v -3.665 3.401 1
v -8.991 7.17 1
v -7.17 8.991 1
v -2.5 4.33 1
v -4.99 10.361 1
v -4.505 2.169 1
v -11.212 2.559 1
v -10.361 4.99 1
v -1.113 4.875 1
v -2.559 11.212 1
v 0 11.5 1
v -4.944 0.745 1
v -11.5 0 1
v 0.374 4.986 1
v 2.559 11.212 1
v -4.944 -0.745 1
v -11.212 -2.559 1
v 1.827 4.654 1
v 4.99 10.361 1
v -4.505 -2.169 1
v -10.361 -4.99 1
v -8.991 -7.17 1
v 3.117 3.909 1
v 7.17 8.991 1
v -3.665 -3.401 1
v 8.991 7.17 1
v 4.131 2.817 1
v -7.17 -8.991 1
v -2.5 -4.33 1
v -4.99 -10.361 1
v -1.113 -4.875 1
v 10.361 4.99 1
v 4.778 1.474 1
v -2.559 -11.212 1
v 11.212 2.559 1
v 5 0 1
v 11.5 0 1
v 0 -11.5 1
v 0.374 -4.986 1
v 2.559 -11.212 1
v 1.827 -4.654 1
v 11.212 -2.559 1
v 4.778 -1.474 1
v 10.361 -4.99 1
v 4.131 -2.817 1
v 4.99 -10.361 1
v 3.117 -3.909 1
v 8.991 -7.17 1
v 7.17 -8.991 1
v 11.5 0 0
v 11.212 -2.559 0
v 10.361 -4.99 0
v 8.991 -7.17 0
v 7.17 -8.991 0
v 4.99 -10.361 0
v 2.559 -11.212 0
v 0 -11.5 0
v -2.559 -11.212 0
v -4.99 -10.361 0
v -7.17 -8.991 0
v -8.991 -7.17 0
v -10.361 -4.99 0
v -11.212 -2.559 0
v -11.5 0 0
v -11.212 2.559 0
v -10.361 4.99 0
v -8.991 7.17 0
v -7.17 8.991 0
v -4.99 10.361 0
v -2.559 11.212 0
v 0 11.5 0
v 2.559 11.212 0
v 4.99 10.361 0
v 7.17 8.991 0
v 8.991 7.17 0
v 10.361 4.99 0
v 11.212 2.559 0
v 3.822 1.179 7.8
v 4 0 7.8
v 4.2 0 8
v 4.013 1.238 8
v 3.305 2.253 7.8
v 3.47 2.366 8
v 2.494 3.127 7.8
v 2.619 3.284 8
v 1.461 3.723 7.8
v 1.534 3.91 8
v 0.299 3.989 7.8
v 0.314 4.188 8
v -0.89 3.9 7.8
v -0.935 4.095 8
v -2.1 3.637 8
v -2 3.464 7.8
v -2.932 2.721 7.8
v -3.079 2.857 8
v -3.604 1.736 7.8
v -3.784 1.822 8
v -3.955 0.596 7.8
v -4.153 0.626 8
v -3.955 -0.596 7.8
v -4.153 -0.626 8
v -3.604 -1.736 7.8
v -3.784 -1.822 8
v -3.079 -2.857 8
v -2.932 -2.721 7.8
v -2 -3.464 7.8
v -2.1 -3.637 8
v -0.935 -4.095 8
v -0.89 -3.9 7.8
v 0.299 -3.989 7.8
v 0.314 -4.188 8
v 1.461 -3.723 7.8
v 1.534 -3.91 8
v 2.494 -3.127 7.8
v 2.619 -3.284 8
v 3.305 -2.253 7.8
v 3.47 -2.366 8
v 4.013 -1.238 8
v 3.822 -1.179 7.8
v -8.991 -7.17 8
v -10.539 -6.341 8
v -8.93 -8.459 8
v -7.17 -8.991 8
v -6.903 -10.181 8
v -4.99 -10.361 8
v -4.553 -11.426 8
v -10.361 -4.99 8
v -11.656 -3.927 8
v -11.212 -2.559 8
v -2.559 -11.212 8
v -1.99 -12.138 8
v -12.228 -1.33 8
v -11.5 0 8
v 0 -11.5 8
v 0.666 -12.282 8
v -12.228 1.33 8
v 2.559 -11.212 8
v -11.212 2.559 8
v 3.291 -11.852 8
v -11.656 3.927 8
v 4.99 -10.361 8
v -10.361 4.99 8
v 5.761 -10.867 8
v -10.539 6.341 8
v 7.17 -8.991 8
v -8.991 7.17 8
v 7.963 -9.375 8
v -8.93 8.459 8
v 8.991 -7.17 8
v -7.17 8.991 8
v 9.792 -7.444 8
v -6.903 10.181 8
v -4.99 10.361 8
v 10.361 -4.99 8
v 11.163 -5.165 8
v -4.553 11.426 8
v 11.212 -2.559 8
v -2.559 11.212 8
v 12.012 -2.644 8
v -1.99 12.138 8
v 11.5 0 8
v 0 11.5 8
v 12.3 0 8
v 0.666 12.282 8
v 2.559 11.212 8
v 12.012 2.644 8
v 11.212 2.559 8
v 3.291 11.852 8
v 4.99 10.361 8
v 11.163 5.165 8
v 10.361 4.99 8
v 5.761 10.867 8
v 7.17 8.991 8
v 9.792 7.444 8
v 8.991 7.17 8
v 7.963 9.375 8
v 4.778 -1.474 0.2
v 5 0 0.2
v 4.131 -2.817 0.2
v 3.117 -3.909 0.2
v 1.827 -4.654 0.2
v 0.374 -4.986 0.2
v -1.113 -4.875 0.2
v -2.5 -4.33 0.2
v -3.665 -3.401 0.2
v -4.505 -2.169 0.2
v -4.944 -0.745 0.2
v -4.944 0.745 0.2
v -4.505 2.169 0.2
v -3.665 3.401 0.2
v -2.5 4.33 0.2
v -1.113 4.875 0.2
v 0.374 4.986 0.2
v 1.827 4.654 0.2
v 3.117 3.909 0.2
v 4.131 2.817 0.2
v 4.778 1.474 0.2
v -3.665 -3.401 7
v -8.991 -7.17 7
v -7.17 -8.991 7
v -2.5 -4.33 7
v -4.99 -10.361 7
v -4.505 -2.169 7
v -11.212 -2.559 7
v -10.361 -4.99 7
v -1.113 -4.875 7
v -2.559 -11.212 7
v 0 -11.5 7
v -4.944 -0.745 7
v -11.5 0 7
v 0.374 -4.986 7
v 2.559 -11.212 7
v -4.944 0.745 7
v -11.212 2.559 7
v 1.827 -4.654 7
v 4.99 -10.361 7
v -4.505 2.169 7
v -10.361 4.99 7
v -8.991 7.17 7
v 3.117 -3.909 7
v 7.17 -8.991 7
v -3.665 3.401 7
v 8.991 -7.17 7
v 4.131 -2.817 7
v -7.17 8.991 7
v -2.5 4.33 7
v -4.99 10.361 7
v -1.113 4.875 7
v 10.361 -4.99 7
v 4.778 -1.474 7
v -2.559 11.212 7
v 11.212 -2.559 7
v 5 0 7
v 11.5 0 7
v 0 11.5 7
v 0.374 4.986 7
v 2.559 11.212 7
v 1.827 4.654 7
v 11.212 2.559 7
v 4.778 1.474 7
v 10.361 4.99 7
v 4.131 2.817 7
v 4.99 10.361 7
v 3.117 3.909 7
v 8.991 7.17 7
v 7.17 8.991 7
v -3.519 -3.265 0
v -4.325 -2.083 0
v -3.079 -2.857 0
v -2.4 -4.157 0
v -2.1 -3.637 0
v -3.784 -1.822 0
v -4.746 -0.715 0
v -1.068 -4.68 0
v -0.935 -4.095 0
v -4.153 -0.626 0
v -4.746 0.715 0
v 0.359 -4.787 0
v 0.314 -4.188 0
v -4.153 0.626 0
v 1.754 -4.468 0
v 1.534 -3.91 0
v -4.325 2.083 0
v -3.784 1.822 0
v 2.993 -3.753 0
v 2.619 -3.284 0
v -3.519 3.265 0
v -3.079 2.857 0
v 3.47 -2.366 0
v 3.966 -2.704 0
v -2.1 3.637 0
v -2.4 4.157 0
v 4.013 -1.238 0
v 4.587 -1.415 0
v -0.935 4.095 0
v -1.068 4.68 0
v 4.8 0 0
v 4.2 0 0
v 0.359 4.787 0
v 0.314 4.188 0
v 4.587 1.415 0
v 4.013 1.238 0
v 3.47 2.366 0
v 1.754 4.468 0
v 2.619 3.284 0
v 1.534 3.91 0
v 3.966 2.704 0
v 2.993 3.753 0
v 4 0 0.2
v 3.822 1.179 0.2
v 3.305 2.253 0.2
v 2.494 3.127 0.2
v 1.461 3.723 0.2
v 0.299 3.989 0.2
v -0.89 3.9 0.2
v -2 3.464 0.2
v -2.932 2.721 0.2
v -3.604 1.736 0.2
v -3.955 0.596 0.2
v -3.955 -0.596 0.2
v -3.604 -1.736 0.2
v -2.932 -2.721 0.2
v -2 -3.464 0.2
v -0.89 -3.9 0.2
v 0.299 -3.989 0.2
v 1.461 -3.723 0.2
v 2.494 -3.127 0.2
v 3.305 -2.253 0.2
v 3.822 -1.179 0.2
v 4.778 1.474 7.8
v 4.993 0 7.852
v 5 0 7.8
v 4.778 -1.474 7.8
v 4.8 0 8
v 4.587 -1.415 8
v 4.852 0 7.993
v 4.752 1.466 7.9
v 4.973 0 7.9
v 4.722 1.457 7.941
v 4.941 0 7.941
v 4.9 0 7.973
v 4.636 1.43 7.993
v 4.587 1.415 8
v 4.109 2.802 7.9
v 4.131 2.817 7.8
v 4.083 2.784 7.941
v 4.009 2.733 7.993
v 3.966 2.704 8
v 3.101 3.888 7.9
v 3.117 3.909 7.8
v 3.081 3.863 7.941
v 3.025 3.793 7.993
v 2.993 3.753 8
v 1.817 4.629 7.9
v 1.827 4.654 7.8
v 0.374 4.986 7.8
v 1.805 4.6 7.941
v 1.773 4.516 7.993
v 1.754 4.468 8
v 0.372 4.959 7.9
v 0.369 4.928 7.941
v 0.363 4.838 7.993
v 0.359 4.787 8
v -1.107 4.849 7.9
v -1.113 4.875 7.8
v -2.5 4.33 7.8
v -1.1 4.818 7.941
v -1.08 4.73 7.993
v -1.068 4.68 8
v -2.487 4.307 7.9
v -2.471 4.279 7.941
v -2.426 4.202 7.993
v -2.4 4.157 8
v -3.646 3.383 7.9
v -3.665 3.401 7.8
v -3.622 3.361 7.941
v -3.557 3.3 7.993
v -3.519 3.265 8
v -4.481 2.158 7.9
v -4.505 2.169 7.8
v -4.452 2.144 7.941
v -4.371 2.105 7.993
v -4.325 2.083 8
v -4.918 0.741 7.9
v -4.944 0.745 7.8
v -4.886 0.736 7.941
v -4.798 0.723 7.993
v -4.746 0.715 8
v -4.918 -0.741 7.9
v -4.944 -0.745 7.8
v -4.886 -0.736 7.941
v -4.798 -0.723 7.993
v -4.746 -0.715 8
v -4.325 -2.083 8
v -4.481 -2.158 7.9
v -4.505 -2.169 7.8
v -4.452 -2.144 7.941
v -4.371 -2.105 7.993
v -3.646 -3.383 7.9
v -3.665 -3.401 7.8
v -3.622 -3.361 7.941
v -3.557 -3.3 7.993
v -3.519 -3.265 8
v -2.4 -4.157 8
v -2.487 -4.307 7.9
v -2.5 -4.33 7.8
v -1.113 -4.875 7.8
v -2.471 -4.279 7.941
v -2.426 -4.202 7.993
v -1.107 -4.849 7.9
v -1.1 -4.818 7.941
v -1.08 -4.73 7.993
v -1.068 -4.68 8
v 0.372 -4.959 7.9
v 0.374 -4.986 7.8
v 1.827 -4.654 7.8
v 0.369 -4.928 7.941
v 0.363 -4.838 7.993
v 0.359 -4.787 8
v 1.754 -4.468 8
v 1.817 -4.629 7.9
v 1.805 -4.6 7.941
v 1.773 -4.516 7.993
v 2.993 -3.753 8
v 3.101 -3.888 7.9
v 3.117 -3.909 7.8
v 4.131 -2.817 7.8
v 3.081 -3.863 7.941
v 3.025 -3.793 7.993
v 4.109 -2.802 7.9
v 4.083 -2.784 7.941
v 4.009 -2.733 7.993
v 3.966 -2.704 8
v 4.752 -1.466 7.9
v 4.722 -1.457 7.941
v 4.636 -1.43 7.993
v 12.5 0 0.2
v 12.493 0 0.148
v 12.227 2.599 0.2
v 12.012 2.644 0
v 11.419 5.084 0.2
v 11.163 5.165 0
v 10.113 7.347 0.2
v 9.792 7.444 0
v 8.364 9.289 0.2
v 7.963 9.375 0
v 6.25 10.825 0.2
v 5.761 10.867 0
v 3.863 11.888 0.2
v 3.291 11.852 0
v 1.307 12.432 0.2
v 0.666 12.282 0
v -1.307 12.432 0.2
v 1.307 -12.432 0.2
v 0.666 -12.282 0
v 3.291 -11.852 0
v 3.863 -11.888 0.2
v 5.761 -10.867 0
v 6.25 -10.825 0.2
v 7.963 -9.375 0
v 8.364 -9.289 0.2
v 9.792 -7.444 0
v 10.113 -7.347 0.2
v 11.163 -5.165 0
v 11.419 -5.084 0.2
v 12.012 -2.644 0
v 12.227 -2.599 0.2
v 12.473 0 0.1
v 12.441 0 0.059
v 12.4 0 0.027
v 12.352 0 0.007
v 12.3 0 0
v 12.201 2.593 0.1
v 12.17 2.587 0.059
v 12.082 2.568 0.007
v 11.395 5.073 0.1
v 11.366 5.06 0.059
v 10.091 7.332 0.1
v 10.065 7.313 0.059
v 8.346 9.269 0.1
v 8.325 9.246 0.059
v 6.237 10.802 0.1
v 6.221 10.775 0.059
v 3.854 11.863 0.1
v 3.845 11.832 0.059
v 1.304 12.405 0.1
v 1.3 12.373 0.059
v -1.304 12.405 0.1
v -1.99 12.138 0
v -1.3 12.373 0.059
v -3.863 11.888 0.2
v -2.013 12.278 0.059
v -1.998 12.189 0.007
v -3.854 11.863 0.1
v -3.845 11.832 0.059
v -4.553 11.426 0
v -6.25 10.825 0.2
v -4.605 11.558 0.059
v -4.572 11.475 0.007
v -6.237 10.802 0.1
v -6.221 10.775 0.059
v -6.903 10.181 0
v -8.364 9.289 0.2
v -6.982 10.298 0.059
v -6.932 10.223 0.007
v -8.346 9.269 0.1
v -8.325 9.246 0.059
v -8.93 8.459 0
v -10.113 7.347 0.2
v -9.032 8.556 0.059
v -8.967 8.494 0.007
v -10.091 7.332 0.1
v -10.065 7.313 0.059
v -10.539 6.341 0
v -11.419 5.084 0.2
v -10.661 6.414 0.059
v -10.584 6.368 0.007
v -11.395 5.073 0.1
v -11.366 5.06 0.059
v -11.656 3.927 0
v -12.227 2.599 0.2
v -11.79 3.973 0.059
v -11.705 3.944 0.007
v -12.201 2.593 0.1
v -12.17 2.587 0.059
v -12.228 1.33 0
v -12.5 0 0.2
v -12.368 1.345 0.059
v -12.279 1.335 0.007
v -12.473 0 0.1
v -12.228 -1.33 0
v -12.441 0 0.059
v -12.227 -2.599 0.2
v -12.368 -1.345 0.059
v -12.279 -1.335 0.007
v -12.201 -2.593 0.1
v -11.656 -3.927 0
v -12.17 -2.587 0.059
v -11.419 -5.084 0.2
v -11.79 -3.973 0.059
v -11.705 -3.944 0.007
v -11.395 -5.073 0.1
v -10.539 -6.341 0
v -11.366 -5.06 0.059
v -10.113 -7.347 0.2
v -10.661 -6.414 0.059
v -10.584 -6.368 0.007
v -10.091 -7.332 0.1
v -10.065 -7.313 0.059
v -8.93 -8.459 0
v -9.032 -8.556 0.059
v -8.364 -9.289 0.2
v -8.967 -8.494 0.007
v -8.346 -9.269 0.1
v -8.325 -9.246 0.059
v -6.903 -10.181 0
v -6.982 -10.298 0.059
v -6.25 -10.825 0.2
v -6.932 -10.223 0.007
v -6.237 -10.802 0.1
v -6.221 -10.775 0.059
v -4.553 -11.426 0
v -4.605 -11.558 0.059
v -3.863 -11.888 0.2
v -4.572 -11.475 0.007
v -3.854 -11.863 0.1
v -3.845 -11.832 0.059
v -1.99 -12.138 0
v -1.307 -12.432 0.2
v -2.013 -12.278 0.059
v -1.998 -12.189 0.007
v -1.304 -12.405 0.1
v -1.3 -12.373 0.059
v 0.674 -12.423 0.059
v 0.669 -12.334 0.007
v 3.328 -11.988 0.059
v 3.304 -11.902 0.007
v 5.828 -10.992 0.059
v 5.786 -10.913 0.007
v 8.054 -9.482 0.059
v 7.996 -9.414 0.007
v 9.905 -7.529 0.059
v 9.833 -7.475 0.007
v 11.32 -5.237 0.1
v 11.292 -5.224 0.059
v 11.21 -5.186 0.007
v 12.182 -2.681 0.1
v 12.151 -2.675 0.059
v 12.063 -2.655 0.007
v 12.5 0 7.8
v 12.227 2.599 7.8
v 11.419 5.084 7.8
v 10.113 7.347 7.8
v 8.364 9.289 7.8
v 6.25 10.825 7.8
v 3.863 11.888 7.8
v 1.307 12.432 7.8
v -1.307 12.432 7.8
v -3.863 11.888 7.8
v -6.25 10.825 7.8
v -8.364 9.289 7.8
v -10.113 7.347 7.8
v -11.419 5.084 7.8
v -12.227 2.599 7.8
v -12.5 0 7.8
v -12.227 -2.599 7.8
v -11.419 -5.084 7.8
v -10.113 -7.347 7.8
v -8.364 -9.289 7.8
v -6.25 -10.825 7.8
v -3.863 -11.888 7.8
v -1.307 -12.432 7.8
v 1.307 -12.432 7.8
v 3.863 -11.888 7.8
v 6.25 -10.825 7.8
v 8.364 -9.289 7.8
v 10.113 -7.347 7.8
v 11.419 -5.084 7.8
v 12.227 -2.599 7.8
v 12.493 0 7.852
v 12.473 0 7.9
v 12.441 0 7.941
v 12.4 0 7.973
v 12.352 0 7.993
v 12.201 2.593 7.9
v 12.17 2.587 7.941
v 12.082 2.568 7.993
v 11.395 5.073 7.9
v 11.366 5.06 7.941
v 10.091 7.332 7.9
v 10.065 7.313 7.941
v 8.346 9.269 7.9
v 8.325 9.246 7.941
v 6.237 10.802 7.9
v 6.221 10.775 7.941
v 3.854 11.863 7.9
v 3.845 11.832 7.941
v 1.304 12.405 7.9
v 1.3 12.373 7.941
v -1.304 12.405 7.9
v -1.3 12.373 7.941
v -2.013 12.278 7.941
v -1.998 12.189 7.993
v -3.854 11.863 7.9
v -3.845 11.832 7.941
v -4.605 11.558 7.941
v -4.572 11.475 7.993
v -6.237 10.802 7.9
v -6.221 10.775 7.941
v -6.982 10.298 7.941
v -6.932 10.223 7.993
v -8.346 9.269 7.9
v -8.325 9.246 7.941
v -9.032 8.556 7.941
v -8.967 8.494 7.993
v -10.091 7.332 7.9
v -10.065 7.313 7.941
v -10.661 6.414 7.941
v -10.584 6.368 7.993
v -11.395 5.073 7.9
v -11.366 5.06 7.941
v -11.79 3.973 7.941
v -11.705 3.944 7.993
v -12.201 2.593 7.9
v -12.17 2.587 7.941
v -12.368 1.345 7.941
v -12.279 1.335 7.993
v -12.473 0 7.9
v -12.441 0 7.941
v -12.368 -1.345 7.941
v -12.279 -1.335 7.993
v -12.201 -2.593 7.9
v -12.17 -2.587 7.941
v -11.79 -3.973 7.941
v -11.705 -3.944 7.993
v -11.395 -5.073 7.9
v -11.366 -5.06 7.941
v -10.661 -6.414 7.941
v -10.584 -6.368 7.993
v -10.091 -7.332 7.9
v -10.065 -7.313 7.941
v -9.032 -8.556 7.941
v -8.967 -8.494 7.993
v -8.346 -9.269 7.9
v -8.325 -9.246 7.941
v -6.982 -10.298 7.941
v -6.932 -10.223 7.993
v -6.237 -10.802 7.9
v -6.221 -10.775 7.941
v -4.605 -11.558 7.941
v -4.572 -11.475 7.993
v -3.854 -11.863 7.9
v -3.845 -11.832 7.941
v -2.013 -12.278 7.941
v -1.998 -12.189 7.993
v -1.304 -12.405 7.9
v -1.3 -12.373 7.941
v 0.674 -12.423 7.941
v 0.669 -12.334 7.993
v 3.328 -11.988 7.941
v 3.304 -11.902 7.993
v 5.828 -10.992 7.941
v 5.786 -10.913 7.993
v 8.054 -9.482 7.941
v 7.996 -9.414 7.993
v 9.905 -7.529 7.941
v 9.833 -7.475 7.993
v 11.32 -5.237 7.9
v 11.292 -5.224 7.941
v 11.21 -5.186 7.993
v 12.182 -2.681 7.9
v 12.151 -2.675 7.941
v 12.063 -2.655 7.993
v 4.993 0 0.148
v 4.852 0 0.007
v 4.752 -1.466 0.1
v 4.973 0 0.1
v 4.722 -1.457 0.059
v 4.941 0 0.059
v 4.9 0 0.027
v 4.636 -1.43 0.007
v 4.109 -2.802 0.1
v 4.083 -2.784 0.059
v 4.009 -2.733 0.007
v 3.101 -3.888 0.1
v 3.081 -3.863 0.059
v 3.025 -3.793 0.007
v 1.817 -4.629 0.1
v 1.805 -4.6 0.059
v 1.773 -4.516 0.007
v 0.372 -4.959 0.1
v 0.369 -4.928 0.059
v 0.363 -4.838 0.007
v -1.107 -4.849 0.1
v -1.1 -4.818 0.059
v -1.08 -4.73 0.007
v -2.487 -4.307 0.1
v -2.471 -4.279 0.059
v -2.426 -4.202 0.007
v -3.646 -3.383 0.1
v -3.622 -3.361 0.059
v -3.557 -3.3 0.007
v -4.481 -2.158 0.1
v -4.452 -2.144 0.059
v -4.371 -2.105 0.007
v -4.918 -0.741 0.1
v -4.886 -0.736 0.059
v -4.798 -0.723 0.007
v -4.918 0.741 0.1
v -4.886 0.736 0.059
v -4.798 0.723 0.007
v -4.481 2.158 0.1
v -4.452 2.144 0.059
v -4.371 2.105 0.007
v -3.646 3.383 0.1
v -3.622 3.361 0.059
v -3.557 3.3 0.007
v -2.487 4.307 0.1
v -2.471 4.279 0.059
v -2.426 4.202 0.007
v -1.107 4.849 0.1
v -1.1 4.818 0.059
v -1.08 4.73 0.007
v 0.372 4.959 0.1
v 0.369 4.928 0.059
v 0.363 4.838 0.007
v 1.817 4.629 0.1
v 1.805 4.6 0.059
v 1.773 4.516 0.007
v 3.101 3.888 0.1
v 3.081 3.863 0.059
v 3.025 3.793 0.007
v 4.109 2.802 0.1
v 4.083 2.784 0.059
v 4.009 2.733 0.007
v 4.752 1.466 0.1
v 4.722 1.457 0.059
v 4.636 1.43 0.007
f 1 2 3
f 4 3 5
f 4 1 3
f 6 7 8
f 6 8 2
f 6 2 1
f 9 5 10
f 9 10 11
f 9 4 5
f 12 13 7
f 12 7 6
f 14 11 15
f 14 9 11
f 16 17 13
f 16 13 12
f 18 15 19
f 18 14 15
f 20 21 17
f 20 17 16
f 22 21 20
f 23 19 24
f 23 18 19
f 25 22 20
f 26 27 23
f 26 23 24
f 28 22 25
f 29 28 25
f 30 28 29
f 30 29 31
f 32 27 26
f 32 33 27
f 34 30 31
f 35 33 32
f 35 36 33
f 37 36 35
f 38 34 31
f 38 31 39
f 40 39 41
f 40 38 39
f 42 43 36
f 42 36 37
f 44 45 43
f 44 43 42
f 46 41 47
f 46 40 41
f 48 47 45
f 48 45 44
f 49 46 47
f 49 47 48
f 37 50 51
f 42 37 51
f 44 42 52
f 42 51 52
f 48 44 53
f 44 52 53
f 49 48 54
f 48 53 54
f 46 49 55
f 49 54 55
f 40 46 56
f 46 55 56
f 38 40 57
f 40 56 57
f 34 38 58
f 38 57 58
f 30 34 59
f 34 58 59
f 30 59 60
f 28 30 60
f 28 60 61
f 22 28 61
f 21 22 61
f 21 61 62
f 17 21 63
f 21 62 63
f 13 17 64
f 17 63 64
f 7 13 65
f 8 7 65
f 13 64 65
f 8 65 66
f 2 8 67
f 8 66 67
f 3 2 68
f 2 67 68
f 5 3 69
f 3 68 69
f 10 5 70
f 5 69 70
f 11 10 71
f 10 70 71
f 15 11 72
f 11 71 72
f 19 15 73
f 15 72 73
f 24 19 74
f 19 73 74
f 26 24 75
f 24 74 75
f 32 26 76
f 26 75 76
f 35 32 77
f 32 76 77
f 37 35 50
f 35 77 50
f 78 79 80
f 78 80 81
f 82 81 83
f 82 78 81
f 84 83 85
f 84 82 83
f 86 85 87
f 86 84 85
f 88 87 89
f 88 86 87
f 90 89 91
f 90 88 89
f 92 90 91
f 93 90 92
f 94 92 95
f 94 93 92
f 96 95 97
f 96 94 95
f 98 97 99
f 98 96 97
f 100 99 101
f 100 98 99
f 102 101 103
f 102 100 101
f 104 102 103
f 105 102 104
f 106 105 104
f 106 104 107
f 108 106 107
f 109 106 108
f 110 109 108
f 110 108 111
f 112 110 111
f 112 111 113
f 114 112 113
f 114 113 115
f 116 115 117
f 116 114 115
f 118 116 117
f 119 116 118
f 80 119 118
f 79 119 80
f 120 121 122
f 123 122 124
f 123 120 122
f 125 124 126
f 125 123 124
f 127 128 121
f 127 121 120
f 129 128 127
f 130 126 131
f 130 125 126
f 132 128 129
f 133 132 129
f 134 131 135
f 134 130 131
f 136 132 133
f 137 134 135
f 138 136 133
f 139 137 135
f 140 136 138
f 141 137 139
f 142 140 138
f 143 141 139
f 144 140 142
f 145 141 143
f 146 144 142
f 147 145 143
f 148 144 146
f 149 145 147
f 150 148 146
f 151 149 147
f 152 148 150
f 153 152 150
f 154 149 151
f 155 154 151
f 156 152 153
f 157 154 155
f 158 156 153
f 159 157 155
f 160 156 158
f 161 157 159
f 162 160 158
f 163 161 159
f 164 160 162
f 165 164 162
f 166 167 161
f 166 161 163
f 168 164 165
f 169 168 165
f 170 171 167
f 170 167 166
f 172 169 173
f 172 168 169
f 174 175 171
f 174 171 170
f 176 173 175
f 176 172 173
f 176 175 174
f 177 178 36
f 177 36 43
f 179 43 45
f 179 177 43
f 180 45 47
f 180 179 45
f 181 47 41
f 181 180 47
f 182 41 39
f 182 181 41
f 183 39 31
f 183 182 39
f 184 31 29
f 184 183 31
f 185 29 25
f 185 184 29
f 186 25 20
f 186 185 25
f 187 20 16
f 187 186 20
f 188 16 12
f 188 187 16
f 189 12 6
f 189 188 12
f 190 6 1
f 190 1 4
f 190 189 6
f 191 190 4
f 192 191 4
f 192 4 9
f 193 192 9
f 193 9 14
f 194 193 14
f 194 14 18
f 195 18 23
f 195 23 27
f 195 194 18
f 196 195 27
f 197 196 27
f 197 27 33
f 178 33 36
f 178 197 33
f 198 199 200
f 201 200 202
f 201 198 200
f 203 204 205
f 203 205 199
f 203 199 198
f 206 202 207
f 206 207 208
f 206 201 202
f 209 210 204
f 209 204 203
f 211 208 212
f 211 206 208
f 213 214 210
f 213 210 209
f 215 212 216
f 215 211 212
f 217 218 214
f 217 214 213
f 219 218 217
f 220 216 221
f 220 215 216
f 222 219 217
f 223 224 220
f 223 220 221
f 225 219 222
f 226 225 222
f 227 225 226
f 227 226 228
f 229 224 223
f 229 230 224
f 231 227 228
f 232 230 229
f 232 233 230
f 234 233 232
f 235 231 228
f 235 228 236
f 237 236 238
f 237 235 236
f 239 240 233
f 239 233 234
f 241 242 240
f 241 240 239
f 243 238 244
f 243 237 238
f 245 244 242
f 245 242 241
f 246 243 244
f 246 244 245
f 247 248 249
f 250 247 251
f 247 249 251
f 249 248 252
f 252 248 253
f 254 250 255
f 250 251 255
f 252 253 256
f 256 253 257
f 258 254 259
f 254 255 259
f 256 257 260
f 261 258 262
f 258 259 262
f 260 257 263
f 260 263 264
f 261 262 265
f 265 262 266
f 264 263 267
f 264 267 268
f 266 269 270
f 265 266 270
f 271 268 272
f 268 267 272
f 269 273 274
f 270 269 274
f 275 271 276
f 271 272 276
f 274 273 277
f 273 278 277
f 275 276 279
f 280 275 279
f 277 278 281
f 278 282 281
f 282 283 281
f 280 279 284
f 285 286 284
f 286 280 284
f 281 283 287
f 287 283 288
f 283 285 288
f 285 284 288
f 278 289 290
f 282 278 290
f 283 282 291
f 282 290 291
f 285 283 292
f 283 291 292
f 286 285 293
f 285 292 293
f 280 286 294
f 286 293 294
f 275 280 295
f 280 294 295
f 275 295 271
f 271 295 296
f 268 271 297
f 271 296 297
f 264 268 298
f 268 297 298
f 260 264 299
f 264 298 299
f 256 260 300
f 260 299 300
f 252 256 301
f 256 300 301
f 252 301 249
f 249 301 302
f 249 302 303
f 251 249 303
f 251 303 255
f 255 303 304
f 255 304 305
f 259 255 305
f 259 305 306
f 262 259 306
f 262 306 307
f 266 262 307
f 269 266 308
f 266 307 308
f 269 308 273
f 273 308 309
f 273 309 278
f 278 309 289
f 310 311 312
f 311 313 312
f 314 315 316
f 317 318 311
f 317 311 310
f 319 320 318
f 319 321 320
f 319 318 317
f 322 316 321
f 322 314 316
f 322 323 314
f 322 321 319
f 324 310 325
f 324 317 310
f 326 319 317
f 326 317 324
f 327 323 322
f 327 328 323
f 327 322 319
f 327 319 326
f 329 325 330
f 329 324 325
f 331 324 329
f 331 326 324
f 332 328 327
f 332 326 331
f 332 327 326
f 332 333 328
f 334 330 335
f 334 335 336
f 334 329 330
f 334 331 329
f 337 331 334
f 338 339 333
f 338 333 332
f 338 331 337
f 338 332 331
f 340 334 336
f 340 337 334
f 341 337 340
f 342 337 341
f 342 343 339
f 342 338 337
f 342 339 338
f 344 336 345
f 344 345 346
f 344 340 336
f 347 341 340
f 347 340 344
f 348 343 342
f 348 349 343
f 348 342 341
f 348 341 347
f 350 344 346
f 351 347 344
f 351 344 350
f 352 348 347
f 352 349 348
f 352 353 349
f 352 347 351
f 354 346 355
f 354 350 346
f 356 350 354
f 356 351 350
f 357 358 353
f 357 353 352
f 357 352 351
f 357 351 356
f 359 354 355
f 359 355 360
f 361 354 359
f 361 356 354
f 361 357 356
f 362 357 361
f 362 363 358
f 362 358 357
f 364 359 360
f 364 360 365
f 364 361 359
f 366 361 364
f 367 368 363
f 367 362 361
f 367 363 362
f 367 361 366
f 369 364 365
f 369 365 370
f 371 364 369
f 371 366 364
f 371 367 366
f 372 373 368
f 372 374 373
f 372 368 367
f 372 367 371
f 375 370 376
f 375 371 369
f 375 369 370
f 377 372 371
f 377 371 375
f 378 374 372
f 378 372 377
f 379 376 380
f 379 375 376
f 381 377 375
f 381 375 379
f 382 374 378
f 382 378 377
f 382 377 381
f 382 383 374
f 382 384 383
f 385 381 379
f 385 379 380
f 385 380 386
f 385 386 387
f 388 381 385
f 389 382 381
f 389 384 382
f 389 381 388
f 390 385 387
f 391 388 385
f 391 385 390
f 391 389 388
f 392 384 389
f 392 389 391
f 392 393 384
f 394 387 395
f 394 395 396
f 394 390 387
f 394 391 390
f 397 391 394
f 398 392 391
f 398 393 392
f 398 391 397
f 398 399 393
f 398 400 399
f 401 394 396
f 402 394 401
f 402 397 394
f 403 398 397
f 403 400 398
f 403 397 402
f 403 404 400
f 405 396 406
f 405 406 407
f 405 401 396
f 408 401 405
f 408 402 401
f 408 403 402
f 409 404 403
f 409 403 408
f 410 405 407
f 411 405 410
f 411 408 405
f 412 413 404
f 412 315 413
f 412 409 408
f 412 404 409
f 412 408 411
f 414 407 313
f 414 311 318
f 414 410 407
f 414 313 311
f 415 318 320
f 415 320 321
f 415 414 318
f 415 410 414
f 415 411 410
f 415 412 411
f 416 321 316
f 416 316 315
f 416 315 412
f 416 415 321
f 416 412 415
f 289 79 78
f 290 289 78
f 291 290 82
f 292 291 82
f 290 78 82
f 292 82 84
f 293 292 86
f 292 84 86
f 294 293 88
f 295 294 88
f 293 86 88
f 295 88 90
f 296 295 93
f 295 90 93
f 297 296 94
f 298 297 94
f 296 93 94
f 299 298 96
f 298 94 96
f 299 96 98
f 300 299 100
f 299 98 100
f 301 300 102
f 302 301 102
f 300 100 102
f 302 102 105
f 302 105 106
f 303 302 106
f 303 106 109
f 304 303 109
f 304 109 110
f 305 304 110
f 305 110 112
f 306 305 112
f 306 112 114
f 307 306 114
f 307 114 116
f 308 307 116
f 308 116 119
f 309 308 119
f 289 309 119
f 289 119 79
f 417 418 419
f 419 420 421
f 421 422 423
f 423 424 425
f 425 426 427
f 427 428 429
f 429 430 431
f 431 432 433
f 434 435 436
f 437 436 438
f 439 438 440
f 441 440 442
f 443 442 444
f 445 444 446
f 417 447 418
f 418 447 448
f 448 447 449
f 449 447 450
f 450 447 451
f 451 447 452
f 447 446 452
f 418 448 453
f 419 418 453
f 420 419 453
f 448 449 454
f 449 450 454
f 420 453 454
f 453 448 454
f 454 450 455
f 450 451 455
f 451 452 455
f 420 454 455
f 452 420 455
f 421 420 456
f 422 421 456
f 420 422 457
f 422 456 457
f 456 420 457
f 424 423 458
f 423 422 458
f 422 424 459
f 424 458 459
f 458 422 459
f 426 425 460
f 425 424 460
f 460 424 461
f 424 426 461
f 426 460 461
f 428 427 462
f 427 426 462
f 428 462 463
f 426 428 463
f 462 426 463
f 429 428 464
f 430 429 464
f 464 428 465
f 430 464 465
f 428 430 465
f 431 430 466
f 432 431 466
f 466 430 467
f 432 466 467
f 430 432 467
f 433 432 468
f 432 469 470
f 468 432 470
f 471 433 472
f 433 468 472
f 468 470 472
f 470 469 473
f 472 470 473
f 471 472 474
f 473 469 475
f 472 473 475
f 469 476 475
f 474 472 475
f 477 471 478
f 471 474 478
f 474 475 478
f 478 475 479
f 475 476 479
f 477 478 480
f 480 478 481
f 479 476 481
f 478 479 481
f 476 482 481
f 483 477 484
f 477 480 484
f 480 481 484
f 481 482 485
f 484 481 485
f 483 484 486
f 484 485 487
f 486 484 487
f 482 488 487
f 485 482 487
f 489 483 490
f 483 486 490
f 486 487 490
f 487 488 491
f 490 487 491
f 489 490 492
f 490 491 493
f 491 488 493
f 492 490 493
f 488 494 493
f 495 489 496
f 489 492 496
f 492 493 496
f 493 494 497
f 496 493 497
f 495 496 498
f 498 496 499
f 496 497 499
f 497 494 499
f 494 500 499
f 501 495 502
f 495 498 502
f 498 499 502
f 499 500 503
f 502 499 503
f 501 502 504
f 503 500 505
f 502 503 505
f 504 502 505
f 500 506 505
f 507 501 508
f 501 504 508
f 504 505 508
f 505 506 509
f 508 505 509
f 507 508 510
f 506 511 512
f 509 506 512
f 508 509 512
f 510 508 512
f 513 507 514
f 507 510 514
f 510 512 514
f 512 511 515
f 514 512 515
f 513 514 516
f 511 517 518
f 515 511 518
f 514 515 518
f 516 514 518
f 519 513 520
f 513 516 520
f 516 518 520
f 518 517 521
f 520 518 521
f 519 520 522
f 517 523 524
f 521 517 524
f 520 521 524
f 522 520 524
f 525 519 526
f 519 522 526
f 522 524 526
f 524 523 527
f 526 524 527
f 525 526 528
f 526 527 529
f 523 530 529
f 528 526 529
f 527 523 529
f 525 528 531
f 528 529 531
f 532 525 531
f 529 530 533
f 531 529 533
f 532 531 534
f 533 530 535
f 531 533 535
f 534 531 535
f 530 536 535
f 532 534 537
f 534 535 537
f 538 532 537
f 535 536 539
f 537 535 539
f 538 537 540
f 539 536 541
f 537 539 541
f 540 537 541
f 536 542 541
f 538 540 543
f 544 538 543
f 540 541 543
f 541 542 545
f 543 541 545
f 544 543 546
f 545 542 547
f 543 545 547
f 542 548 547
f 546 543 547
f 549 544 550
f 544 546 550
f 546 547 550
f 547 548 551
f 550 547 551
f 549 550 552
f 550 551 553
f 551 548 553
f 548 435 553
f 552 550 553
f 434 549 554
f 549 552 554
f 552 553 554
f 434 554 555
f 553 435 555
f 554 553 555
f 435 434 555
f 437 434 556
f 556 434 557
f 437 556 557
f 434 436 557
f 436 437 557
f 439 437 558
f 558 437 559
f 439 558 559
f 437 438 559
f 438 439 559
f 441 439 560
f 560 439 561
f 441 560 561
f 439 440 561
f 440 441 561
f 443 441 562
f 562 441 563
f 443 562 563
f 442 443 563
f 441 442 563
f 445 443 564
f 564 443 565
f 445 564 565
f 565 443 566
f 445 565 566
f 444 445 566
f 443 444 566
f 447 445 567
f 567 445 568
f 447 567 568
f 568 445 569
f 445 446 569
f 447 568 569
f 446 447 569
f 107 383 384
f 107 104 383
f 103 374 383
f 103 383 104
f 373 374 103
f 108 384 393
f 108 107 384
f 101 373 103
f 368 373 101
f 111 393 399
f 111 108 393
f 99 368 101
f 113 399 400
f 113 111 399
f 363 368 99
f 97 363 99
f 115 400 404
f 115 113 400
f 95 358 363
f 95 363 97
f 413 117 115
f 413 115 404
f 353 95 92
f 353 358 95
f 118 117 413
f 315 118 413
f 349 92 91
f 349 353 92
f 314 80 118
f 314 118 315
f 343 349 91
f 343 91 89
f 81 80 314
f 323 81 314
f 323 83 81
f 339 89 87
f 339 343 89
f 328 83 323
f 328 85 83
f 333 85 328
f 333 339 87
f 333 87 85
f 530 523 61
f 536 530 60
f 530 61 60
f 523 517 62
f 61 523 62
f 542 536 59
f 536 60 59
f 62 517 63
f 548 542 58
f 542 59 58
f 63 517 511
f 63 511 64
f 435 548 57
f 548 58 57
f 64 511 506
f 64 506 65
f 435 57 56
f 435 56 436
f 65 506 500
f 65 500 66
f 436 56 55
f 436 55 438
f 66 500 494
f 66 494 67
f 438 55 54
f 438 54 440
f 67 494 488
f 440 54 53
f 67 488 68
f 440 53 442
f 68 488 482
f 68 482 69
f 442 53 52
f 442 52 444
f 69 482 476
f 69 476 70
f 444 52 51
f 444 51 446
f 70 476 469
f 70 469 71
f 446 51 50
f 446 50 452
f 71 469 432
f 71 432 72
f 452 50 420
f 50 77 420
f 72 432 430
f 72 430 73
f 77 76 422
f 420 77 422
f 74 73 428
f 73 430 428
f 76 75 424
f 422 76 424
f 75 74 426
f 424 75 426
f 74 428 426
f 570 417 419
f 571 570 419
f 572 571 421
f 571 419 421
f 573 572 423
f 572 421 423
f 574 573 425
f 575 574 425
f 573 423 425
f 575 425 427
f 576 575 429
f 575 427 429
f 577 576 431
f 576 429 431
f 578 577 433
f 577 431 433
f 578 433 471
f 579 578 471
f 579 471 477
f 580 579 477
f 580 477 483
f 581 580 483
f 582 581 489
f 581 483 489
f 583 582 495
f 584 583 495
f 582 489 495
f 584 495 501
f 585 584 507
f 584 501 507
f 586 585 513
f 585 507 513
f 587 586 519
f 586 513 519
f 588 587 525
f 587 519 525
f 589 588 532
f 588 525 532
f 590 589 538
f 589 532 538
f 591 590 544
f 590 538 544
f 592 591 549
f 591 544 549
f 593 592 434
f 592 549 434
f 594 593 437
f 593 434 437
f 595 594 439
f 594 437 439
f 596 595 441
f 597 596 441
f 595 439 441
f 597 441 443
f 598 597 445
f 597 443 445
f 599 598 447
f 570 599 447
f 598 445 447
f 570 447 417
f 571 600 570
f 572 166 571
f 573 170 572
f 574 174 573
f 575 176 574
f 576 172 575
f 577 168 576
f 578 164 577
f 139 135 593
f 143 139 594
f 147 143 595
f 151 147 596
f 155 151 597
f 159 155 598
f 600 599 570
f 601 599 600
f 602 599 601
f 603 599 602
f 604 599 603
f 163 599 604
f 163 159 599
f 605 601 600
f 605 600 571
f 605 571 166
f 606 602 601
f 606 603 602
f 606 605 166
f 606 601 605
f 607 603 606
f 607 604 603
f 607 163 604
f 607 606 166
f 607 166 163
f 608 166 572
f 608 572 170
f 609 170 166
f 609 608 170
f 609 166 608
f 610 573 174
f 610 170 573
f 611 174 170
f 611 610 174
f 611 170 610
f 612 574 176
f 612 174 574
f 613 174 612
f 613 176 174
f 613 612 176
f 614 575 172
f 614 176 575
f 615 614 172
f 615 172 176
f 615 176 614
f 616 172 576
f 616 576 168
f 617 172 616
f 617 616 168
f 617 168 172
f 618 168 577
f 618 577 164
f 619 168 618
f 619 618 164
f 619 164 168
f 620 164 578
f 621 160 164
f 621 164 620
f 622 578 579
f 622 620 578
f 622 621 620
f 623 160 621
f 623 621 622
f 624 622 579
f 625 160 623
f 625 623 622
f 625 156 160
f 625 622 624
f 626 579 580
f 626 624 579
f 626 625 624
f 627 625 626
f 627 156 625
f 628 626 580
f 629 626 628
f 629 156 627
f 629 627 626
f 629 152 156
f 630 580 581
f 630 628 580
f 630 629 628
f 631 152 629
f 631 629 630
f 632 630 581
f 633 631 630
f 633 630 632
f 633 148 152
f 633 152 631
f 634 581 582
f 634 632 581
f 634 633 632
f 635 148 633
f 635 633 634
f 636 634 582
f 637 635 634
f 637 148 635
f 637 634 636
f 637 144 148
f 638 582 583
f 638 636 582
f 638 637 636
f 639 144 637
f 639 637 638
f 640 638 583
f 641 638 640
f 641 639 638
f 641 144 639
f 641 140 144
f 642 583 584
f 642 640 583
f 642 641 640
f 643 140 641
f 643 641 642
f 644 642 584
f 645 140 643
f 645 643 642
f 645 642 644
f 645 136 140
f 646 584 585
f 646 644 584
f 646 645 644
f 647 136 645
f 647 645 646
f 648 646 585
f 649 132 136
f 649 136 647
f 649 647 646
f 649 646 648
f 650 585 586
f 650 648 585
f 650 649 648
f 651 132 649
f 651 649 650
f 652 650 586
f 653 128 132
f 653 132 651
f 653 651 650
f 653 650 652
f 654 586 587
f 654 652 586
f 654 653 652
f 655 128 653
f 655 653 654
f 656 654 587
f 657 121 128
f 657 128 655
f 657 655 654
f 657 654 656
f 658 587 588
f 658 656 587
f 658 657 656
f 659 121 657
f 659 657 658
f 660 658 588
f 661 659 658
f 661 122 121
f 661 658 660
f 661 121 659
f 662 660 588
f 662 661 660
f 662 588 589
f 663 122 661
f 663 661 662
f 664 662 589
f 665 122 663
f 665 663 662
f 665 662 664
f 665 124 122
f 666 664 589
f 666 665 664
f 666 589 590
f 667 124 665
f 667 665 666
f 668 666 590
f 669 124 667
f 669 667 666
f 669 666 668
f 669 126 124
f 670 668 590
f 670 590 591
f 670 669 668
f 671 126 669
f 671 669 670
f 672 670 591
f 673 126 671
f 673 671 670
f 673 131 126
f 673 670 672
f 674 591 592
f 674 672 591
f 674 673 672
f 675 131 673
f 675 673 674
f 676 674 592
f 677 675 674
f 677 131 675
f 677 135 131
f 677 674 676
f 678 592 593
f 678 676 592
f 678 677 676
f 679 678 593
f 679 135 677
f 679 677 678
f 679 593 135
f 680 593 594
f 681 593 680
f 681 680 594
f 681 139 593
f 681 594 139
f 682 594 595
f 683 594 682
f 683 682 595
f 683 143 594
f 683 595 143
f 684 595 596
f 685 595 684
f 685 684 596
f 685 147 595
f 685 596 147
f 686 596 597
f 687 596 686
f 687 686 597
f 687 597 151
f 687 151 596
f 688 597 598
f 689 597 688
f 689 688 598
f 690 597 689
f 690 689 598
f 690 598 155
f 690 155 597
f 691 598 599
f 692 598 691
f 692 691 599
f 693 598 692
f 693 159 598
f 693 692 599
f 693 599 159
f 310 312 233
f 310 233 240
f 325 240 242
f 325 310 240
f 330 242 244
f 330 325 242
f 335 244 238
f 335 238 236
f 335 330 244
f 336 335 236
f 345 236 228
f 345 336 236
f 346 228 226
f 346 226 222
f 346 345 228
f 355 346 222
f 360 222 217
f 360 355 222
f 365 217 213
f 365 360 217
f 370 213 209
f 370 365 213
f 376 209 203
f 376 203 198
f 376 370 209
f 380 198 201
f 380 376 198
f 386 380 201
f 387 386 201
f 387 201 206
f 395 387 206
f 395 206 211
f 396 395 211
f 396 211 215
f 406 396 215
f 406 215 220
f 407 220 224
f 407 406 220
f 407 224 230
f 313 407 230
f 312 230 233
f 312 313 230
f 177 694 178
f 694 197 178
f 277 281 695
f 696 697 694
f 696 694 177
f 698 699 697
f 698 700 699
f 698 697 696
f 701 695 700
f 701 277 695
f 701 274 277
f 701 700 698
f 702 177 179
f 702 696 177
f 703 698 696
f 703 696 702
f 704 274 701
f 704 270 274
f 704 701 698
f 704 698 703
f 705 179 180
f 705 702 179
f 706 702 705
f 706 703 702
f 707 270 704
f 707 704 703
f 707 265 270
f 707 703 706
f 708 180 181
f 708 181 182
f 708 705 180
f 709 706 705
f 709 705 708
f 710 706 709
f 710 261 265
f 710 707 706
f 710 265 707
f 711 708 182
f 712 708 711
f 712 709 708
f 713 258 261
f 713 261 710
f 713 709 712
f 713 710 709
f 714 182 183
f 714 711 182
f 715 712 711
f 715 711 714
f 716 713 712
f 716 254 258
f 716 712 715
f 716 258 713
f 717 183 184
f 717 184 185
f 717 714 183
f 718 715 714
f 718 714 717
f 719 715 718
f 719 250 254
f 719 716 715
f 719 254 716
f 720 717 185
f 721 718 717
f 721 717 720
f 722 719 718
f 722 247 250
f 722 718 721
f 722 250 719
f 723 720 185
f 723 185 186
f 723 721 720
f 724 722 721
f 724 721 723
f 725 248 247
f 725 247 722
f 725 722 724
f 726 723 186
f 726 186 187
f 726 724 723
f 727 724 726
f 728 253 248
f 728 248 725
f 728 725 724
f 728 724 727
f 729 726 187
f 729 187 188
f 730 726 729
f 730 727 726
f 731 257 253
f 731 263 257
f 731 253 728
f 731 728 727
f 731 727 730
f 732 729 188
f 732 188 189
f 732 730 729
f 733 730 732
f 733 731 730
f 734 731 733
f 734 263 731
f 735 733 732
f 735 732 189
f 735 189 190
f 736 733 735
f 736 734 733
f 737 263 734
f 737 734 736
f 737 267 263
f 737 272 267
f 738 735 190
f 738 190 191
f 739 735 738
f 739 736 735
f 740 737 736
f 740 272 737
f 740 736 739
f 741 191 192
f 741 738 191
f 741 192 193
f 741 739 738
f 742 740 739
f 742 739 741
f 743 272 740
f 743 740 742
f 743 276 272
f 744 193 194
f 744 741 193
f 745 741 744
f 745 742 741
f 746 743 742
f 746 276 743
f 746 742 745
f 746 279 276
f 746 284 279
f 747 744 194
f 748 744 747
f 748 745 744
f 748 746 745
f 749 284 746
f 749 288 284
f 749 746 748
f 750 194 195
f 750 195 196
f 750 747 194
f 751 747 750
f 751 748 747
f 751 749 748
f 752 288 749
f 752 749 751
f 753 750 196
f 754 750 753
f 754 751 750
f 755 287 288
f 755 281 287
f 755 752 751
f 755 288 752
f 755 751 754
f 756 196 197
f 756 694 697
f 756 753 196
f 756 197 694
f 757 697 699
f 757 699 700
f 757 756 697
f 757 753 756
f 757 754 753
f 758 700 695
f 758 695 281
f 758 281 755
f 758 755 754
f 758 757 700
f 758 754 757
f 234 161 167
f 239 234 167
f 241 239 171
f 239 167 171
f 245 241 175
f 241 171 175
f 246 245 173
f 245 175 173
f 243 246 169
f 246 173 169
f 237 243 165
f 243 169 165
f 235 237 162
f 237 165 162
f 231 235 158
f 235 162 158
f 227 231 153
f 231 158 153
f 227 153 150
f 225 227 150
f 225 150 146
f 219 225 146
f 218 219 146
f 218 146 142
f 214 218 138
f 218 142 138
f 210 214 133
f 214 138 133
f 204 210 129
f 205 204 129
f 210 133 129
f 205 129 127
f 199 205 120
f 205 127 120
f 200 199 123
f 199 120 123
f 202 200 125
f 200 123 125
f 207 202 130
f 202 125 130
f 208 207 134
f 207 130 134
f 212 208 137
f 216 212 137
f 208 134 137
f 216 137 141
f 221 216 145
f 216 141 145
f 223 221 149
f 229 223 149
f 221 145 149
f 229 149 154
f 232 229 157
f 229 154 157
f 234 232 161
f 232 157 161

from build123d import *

# Parameters (mm, degrees)
F0_R     = 12.5
F1_DEPTH = 8
F2_R     = 4
F3_DEPTH = 8.001
F2_R_2   = 11.5
F2_R_3   = 5
F4_DEPTH = 1
F5_R     = 11.5
F5_R_2   = 5
F6_DEPTH = 1
F7_R     = 0.2
F8_SIZE  = 0.2


with BuildPart() as f1:
    # F0 (on Top) → F1 (new body)
    with BuildSketch(Plane.XY):
        Circle(F0_R)
    extrude(amount=F1_DEPTH)

    # F2 (on face) → F3 (cut, through all)
    with BuildSketch(Plane.XY.offset(8)):
        Circle(F2_R)
    extrude(amount=-F3_DEPTH, mode=Mode.SUBTRACT)

    # F2 (on face) → F4 (cut)
    with BuildSketch(Plane.XY.offset(8)):
        Circle(F2_R_2)
        Circle(F2_R_3, mode=Mode.SUBTRACT)
    extrude(amount=-F4_DEPTH, mode=Mode.SUBTRACT)

    # F5 (on face) → F6 (cut)
    with BuildSketch(Plane(origin=(0, 0, 0), x_dir=(1, 0, 0), z_dir=(0, 0, -1))):
        Circle(F5_R)
        Circle(F5_R_2, mode=Mode.SUBTRACT)
    extrude(amount=-F6_DEPTH, mode=Mode.SUBTRACT)

    # F7
    f7_edges = [f1.edges().sort_by_distance(p)[0] for p in [
        (-12.5, 0, 8),
        (-12.5, 0, 0),
        (-5, 0, 8),
        (-5, 0, 0),
    ]]
    fillet(f7_edges, radius=F7_R)

    # F8
    f8_edges = [f1.edges().sort_by_distance(p)[0] for p in [
        (-4, 0, 8),
        (-4, 0, 0),
    ]]
    chamfer(f8_edges, length=F8_SIZE)


solid = f1.part
